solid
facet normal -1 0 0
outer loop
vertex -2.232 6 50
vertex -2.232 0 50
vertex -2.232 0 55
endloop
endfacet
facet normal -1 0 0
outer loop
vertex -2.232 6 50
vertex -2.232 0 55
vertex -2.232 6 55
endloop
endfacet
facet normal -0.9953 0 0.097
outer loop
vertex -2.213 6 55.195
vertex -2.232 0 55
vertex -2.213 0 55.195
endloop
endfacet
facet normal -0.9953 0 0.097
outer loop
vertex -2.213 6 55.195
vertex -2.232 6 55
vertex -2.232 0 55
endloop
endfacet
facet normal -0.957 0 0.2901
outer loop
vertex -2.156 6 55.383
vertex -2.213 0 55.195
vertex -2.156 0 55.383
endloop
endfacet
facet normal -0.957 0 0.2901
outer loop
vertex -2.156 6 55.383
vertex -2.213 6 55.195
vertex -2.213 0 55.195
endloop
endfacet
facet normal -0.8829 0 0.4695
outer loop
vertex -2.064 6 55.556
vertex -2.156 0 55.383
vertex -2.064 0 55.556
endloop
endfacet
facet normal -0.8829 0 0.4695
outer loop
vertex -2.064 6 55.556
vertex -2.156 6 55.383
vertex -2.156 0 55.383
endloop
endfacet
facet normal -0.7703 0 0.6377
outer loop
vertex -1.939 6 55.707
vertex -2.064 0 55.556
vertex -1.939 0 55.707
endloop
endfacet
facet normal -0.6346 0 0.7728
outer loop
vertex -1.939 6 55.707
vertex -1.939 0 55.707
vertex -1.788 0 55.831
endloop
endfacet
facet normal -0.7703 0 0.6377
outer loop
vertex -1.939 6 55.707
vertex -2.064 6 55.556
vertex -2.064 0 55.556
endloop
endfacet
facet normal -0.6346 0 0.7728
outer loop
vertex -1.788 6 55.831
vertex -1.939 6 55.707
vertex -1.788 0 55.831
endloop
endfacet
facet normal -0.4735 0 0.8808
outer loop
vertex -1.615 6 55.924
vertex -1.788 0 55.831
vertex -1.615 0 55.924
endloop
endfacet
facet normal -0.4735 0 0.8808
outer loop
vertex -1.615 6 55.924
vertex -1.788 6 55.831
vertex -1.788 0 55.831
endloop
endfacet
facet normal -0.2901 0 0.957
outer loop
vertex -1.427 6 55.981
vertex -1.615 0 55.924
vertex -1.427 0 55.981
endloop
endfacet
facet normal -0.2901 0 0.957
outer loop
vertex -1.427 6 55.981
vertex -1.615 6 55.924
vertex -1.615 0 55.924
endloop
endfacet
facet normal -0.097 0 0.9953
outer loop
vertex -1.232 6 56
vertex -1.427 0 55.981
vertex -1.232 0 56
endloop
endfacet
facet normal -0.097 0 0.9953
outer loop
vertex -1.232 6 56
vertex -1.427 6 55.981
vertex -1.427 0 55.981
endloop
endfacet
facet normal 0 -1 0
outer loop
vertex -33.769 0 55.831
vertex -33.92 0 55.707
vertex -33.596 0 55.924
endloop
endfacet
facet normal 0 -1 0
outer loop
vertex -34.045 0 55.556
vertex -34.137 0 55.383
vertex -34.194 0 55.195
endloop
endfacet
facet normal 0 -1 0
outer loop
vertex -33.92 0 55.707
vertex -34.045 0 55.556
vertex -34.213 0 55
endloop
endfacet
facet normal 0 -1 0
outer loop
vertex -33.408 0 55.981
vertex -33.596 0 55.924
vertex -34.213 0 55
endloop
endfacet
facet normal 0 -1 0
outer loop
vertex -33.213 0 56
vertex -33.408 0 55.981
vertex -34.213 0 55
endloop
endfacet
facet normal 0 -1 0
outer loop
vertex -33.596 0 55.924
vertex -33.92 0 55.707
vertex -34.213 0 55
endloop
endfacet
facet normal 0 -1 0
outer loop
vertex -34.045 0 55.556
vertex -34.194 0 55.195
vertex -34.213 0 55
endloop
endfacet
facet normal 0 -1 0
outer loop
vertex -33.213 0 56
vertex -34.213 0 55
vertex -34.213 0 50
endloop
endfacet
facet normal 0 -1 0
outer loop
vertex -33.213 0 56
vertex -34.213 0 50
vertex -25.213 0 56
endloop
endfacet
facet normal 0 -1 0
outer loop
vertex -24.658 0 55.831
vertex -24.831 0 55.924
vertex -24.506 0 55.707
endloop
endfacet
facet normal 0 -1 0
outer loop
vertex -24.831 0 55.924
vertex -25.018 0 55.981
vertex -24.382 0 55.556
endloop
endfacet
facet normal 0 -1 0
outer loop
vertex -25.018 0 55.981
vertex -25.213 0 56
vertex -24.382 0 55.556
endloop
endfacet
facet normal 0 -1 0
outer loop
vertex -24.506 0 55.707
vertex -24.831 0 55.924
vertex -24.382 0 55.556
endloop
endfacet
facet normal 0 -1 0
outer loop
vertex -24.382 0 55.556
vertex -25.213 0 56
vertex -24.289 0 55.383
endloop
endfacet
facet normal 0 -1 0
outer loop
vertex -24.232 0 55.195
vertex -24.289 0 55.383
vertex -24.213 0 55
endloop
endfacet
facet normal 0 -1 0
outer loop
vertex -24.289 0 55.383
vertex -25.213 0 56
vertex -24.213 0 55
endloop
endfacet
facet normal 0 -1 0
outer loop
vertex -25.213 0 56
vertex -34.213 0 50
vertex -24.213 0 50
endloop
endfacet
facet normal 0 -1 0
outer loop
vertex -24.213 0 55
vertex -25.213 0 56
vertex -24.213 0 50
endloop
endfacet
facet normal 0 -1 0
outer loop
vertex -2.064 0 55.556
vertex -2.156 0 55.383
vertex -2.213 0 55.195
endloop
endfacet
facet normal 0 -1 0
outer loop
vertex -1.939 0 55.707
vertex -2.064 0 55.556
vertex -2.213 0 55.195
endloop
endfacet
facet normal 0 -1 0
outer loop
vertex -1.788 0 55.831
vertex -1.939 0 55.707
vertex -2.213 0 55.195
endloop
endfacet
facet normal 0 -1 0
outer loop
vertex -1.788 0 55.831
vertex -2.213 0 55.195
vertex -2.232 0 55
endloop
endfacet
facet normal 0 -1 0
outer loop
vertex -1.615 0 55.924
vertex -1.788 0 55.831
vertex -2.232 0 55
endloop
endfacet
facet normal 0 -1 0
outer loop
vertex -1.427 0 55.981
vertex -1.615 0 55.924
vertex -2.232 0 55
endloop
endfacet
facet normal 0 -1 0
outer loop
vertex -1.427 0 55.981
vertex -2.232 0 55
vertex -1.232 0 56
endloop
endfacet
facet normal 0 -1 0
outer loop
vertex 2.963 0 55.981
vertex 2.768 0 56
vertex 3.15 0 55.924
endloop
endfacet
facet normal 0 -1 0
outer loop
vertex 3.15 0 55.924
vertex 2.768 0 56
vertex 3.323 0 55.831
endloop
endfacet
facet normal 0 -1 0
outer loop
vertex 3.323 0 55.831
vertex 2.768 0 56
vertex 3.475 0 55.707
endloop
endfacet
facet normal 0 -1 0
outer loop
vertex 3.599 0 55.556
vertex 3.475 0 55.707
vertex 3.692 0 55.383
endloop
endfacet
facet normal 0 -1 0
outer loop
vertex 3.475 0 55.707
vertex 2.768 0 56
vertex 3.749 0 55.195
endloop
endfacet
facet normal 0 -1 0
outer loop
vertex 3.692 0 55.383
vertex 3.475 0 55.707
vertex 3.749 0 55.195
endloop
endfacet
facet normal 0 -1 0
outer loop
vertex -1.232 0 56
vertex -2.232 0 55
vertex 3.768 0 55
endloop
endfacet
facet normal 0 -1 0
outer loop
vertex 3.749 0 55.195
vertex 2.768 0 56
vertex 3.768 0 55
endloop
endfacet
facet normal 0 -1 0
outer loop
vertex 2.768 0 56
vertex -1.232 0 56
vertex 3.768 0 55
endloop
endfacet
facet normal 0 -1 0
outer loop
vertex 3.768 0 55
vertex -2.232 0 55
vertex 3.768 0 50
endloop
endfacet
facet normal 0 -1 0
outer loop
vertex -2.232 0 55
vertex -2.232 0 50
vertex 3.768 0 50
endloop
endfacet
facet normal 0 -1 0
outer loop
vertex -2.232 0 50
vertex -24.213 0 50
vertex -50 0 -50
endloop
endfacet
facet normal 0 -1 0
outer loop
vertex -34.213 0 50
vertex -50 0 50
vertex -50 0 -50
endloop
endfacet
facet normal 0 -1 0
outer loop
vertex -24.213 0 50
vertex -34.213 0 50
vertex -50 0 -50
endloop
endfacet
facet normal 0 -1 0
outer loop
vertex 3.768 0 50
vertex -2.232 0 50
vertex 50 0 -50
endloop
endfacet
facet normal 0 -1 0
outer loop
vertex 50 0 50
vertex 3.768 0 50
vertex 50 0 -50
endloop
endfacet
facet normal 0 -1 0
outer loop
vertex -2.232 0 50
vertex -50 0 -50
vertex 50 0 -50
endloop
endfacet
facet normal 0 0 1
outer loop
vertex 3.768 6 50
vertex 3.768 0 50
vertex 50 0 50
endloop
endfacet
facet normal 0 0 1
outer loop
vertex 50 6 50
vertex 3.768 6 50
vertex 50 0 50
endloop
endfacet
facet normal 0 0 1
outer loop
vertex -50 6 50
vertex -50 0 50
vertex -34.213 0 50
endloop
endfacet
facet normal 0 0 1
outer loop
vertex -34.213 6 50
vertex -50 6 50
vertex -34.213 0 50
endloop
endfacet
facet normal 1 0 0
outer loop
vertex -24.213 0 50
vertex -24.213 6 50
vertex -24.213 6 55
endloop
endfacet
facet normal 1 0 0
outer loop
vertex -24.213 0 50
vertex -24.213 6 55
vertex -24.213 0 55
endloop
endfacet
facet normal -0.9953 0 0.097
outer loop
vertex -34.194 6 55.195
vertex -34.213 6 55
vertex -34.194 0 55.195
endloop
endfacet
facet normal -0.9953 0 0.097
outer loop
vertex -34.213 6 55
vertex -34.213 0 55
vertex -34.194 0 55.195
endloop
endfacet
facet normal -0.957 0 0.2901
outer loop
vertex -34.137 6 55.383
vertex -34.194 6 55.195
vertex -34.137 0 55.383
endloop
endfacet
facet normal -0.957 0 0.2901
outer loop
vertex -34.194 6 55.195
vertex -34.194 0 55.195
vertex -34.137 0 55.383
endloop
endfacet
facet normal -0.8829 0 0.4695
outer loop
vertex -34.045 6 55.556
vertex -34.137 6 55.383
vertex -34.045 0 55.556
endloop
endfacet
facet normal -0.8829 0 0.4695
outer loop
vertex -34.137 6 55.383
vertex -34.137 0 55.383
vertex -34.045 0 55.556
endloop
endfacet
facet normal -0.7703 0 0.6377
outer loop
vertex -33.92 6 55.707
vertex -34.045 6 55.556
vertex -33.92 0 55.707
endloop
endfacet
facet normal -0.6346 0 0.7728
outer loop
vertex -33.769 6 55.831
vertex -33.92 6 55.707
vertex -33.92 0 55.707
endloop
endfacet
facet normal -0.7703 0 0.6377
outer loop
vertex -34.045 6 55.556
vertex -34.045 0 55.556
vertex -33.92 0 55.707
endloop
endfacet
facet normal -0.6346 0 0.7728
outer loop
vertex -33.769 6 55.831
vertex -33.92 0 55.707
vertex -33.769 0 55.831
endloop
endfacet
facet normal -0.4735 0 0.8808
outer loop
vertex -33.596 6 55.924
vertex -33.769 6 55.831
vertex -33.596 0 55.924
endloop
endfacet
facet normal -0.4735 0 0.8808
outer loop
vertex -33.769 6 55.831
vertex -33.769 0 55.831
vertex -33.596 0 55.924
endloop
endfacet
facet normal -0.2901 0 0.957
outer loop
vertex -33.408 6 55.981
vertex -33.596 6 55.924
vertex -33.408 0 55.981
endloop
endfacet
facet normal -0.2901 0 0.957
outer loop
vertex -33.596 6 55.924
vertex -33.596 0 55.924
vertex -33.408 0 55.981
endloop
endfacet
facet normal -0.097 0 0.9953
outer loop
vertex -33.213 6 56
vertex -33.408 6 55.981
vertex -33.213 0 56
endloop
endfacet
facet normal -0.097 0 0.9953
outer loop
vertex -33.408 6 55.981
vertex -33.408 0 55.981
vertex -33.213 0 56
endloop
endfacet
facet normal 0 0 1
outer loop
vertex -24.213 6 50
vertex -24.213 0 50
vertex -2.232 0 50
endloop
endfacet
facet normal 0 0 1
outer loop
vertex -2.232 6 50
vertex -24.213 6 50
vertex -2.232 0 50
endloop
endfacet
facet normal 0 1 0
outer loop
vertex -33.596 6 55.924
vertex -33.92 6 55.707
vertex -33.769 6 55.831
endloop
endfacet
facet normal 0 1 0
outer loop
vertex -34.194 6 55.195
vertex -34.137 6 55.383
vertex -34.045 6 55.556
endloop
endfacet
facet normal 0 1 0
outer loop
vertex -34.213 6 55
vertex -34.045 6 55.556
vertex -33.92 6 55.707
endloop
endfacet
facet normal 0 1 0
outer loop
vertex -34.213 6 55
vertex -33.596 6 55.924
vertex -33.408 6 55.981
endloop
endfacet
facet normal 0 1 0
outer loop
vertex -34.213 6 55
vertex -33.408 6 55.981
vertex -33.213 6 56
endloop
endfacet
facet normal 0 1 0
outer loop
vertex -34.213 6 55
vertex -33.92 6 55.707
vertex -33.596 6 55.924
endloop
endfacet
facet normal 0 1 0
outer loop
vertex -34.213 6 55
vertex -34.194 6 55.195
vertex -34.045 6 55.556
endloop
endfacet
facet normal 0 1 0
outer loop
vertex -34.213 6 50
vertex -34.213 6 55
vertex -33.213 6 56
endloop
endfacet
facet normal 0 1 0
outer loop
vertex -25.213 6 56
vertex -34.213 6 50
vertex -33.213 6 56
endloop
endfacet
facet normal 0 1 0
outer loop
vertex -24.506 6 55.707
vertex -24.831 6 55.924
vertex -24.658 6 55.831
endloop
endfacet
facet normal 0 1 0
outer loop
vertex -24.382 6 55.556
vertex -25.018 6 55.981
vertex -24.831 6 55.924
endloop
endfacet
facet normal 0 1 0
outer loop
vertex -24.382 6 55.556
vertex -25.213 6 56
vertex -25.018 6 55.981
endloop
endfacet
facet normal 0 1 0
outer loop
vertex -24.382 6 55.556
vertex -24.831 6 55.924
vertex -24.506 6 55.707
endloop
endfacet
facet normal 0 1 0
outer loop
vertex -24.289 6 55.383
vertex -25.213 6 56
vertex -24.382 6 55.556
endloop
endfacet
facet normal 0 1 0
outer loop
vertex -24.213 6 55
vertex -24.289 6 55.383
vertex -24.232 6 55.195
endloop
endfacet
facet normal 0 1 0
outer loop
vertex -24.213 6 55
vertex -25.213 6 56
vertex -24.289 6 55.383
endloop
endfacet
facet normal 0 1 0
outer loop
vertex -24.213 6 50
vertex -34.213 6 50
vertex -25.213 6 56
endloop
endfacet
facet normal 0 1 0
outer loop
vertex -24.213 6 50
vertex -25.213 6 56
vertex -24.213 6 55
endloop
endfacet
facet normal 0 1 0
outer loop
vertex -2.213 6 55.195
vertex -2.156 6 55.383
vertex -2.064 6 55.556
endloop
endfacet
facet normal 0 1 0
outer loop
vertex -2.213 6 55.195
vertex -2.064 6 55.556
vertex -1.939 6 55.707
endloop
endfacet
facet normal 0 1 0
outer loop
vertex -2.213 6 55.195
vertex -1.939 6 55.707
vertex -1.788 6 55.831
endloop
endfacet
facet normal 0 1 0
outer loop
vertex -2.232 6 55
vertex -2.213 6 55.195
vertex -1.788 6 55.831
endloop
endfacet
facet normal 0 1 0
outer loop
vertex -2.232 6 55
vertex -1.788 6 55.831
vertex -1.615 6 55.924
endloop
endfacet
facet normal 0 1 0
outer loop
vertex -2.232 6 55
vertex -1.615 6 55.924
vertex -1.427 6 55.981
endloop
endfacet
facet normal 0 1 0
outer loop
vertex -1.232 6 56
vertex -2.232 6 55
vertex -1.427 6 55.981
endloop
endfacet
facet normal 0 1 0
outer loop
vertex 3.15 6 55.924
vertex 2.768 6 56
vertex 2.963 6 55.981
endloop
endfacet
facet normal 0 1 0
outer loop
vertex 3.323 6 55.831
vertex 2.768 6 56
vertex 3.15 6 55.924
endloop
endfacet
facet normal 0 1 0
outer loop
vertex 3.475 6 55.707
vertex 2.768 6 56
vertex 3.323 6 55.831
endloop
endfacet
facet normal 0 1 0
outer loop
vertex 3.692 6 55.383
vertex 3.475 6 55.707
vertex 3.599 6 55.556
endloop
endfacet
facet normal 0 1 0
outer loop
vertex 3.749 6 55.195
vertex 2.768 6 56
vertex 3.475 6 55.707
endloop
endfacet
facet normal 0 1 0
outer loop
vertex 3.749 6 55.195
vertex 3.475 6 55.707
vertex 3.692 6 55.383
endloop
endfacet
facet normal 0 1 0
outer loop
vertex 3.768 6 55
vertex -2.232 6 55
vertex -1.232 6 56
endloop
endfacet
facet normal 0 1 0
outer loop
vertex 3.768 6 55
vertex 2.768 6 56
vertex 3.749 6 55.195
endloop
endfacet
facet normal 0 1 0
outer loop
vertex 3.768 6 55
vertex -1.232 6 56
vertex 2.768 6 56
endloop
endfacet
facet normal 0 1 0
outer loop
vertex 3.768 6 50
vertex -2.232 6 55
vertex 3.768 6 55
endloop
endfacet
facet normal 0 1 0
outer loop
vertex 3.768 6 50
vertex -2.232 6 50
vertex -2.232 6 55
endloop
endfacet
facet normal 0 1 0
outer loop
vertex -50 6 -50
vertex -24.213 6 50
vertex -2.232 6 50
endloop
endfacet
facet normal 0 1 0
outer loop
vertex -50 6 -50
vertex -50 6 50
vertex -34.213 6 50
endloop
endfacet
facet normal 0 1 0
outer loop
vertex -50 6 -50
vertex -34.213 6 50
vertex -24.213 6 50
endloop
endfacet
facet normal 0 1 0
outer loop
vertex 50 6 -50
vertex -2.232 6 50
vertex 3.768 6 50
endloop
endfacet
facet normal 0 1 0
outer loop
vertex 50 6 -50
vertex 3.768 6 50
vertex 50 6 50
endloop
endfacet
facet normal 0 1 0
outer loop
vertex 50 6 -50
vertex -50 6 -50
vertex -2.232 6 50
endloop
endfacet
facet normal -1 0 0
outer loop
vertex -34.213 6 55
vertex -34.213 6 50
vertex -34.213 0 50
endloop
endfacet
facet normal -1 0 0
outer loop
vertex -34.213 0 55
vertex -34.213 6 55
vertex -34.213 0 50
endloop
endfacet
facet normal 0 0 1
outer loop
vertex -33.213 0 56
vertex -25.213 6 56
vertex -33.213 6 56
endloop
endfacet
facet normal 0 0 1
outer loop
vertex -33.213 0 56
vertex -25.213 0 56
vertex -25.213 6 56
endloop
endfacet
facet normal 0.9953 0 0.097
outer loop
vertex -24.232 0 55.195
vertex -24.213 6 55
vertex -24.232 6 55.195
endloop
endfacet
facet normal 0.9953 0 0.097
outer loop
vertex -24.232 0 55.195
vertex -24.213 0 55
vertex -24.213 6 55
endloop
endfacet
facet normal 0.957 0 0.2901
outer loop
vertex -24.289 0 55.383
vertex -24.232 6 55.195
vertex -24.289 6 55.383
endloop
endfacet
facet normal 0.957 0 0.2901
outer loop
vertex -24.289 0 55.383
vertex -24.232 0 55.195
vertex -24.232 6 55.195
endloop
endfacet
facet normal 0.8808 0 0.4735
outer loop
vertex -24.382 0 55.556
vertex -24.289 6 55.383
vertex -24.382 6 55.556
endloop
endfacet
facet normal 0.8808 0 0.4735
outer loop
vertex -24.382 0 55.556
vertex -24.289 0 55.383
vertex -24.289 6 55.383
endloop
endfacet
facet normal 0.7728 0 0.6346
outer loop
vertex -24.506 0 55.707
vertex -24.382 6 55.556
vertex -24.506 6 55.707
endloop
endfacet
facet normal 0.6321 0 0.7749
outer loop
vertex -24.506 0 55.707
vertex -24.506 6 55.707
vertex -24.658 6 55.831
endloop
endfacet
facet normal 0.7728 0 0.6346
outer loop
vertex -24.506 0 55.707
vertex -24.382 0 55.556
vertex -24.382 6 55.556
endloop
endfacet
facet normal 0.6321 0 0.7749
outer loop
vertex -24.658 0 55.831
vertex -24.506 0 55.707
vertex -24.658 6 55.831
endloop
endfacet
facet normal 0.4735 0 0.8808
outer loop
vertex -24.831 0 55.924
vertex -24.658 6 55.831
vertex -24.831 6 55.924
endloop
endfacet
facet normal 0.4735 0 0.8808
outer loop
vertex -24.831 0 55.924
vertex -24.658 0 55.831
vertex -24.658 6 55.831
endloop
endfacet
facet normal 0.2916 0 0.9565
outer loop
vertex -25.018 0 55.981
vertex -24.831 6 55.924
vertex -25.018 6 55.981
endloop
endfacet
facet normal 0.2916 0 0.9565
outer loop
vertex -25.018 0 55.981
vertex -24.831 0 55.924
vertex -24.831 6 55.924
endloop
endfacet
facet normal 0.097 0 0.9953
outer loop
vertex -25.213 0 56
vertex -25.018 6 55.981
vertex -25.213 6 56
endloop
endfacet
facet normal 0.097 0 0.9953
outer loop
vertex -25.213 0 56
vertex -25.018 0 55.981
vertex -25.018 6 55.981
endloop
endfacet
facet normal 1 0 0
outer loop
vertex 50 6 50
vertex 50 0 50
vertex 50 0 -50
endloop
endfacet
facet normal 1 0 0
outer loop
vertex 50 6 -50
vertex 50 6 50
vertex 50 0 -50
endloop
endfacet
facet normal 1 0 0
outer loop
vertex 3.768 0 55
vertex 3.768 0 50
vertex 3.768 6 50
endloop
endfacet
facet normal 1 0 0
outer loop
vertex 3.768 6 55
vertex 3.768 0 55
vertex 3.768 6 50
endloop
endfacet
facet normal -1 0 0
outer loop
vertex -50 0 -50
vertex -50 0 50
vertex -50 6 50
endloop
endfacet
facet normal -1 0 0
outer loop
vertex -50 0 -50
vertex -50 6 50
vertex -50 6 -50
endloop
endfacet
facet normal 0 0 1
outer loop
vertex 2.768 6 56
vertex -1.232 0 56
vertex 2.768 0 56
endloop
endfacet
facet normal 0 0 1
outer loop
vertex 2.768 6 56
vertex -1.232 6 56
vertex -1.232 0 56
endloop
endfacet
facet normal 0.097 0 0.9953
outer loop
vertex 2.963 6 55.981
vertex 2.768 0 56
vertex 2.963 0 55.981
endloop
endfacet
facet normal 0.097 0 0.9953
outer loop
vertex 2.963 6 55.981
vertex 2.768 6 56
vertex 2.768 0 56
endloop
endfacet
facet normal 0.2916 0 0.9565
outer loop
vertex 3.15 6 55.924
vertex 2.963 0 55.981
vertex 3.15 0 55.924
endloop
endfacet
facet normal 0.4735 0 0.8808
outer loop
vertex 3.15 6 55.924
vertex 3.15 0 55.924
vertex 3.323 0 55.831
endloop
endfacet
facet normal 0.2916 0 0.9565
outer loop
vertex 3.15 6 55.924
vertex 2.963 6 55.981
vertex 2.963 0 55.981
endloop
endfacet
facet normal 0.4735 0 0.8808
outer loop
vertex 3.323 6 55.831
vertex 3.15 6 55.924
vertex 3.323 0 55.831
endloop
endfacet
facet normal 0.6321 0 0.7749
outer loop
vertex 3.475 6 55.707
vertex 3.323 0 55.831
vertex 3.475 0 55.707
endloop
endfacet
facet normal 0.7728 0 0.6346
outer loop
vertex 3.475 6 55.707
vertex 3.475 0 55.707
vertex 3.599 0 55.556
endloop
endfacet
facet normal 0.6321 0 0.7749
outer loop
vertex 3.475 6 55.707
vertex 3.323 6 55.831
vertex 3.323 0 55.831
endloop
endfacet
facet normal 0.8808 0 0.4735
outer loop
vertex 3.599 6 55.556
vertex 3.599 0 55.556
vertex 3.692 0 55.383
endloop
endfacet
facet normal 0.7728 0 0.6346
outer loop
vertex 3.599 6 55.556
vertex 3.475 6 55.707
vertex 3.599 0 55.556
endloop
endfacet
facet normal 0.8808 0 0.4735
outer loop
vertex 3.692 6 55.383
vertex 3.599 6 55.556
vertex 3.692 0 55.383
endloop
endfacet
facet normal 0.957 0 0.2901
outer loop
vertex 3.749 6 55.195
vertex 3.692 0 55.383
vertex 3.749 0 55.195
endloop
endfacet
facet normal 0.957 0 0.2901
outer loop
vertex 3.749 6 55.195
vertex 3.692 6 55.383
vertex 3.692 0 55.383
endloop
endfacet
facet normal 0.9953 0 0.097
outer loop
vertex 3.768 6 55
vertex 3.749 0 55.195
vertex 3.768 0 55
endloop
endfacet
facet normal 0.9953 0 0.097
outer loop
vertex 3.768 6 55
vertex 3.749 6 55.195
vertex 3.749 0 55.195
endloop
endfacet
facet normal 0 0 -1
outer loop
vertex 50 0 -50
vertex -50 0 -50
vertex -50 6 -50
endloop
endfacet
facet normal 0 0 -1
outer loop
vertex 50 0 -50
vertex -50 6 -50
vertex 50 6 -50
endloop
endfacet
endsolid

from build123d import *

# Parameters (mm, degrees)
SKETCH1_W              = 100
SKETCH1_H              = 100
BOSS_EXTRUDE1_DEPTH    = 6
SKETCH234_W            = 6
SKETCH234_H            = 6
BOSS_EXTRUDE234_DEPTH  = 6
FILLET134_R            = 1
SKETCH2342_W           = 10
SKETCH2342_H           = 6
BOSS_EXTRUDE2342_DEPTH = 6
FILLET1342_R           = 1


with BuildPart() as part:
    # Sketch1 → Boss-Extrude1 (new body)
    with BuildSketch(Plane(origin=(0, 0, 0), x_dir=(1, 0, 0), z_dir=(0, 1, 0))):
        Rectangle(SKETCH1_W, SKETCH1_H)
    extrude(amount=BOSS_EXTRUDE1_DEPTH)

    # Sketch234 → Boss-Extrude234 (add)
    with BuildSketch(Plane.XY.offset(50)):
        with Locations((0.767778608, 3)):
            Rectangle(SKETCH234_W, SKETCH234_H)
    extrude(amount=BOSS_EXTRUDE234_DEPTH)

    # Fillet134
    fillet134_edges = [part.edges().sort_by_distance(p)[0] for p in [
        (-2.232221392, 3, 56),
        (3.767778608, 3, 56),
    ]]
    fillet(fillet134_edges, radius=FILLET134_R)

    # Sketch2342 → Boss-Extrude2342 (add)
    with BuildSketch(Plane(origin=(-28.445435161, 6, 50), x_dir=(-1, 0, 0), z_dir=(0, 0, 1))):
        with Locations((0.767778608, 3)):
            Rectangle(SKETCH2342_W, SKETCH2342_H)
    extrude(amount=BOSS_EXTRUDE2342_DEPTH)

    # Fillet1342
    fillet1342_edges = [part.edges().sort_by_distance(p)[0] for p in [
        (-34.213213769, 3, 56),
        (-24.213213769, 3, 56),
    ]]
    fillet(fillet1342_edges, radius=FILLET1342_R)


solid = part.part
